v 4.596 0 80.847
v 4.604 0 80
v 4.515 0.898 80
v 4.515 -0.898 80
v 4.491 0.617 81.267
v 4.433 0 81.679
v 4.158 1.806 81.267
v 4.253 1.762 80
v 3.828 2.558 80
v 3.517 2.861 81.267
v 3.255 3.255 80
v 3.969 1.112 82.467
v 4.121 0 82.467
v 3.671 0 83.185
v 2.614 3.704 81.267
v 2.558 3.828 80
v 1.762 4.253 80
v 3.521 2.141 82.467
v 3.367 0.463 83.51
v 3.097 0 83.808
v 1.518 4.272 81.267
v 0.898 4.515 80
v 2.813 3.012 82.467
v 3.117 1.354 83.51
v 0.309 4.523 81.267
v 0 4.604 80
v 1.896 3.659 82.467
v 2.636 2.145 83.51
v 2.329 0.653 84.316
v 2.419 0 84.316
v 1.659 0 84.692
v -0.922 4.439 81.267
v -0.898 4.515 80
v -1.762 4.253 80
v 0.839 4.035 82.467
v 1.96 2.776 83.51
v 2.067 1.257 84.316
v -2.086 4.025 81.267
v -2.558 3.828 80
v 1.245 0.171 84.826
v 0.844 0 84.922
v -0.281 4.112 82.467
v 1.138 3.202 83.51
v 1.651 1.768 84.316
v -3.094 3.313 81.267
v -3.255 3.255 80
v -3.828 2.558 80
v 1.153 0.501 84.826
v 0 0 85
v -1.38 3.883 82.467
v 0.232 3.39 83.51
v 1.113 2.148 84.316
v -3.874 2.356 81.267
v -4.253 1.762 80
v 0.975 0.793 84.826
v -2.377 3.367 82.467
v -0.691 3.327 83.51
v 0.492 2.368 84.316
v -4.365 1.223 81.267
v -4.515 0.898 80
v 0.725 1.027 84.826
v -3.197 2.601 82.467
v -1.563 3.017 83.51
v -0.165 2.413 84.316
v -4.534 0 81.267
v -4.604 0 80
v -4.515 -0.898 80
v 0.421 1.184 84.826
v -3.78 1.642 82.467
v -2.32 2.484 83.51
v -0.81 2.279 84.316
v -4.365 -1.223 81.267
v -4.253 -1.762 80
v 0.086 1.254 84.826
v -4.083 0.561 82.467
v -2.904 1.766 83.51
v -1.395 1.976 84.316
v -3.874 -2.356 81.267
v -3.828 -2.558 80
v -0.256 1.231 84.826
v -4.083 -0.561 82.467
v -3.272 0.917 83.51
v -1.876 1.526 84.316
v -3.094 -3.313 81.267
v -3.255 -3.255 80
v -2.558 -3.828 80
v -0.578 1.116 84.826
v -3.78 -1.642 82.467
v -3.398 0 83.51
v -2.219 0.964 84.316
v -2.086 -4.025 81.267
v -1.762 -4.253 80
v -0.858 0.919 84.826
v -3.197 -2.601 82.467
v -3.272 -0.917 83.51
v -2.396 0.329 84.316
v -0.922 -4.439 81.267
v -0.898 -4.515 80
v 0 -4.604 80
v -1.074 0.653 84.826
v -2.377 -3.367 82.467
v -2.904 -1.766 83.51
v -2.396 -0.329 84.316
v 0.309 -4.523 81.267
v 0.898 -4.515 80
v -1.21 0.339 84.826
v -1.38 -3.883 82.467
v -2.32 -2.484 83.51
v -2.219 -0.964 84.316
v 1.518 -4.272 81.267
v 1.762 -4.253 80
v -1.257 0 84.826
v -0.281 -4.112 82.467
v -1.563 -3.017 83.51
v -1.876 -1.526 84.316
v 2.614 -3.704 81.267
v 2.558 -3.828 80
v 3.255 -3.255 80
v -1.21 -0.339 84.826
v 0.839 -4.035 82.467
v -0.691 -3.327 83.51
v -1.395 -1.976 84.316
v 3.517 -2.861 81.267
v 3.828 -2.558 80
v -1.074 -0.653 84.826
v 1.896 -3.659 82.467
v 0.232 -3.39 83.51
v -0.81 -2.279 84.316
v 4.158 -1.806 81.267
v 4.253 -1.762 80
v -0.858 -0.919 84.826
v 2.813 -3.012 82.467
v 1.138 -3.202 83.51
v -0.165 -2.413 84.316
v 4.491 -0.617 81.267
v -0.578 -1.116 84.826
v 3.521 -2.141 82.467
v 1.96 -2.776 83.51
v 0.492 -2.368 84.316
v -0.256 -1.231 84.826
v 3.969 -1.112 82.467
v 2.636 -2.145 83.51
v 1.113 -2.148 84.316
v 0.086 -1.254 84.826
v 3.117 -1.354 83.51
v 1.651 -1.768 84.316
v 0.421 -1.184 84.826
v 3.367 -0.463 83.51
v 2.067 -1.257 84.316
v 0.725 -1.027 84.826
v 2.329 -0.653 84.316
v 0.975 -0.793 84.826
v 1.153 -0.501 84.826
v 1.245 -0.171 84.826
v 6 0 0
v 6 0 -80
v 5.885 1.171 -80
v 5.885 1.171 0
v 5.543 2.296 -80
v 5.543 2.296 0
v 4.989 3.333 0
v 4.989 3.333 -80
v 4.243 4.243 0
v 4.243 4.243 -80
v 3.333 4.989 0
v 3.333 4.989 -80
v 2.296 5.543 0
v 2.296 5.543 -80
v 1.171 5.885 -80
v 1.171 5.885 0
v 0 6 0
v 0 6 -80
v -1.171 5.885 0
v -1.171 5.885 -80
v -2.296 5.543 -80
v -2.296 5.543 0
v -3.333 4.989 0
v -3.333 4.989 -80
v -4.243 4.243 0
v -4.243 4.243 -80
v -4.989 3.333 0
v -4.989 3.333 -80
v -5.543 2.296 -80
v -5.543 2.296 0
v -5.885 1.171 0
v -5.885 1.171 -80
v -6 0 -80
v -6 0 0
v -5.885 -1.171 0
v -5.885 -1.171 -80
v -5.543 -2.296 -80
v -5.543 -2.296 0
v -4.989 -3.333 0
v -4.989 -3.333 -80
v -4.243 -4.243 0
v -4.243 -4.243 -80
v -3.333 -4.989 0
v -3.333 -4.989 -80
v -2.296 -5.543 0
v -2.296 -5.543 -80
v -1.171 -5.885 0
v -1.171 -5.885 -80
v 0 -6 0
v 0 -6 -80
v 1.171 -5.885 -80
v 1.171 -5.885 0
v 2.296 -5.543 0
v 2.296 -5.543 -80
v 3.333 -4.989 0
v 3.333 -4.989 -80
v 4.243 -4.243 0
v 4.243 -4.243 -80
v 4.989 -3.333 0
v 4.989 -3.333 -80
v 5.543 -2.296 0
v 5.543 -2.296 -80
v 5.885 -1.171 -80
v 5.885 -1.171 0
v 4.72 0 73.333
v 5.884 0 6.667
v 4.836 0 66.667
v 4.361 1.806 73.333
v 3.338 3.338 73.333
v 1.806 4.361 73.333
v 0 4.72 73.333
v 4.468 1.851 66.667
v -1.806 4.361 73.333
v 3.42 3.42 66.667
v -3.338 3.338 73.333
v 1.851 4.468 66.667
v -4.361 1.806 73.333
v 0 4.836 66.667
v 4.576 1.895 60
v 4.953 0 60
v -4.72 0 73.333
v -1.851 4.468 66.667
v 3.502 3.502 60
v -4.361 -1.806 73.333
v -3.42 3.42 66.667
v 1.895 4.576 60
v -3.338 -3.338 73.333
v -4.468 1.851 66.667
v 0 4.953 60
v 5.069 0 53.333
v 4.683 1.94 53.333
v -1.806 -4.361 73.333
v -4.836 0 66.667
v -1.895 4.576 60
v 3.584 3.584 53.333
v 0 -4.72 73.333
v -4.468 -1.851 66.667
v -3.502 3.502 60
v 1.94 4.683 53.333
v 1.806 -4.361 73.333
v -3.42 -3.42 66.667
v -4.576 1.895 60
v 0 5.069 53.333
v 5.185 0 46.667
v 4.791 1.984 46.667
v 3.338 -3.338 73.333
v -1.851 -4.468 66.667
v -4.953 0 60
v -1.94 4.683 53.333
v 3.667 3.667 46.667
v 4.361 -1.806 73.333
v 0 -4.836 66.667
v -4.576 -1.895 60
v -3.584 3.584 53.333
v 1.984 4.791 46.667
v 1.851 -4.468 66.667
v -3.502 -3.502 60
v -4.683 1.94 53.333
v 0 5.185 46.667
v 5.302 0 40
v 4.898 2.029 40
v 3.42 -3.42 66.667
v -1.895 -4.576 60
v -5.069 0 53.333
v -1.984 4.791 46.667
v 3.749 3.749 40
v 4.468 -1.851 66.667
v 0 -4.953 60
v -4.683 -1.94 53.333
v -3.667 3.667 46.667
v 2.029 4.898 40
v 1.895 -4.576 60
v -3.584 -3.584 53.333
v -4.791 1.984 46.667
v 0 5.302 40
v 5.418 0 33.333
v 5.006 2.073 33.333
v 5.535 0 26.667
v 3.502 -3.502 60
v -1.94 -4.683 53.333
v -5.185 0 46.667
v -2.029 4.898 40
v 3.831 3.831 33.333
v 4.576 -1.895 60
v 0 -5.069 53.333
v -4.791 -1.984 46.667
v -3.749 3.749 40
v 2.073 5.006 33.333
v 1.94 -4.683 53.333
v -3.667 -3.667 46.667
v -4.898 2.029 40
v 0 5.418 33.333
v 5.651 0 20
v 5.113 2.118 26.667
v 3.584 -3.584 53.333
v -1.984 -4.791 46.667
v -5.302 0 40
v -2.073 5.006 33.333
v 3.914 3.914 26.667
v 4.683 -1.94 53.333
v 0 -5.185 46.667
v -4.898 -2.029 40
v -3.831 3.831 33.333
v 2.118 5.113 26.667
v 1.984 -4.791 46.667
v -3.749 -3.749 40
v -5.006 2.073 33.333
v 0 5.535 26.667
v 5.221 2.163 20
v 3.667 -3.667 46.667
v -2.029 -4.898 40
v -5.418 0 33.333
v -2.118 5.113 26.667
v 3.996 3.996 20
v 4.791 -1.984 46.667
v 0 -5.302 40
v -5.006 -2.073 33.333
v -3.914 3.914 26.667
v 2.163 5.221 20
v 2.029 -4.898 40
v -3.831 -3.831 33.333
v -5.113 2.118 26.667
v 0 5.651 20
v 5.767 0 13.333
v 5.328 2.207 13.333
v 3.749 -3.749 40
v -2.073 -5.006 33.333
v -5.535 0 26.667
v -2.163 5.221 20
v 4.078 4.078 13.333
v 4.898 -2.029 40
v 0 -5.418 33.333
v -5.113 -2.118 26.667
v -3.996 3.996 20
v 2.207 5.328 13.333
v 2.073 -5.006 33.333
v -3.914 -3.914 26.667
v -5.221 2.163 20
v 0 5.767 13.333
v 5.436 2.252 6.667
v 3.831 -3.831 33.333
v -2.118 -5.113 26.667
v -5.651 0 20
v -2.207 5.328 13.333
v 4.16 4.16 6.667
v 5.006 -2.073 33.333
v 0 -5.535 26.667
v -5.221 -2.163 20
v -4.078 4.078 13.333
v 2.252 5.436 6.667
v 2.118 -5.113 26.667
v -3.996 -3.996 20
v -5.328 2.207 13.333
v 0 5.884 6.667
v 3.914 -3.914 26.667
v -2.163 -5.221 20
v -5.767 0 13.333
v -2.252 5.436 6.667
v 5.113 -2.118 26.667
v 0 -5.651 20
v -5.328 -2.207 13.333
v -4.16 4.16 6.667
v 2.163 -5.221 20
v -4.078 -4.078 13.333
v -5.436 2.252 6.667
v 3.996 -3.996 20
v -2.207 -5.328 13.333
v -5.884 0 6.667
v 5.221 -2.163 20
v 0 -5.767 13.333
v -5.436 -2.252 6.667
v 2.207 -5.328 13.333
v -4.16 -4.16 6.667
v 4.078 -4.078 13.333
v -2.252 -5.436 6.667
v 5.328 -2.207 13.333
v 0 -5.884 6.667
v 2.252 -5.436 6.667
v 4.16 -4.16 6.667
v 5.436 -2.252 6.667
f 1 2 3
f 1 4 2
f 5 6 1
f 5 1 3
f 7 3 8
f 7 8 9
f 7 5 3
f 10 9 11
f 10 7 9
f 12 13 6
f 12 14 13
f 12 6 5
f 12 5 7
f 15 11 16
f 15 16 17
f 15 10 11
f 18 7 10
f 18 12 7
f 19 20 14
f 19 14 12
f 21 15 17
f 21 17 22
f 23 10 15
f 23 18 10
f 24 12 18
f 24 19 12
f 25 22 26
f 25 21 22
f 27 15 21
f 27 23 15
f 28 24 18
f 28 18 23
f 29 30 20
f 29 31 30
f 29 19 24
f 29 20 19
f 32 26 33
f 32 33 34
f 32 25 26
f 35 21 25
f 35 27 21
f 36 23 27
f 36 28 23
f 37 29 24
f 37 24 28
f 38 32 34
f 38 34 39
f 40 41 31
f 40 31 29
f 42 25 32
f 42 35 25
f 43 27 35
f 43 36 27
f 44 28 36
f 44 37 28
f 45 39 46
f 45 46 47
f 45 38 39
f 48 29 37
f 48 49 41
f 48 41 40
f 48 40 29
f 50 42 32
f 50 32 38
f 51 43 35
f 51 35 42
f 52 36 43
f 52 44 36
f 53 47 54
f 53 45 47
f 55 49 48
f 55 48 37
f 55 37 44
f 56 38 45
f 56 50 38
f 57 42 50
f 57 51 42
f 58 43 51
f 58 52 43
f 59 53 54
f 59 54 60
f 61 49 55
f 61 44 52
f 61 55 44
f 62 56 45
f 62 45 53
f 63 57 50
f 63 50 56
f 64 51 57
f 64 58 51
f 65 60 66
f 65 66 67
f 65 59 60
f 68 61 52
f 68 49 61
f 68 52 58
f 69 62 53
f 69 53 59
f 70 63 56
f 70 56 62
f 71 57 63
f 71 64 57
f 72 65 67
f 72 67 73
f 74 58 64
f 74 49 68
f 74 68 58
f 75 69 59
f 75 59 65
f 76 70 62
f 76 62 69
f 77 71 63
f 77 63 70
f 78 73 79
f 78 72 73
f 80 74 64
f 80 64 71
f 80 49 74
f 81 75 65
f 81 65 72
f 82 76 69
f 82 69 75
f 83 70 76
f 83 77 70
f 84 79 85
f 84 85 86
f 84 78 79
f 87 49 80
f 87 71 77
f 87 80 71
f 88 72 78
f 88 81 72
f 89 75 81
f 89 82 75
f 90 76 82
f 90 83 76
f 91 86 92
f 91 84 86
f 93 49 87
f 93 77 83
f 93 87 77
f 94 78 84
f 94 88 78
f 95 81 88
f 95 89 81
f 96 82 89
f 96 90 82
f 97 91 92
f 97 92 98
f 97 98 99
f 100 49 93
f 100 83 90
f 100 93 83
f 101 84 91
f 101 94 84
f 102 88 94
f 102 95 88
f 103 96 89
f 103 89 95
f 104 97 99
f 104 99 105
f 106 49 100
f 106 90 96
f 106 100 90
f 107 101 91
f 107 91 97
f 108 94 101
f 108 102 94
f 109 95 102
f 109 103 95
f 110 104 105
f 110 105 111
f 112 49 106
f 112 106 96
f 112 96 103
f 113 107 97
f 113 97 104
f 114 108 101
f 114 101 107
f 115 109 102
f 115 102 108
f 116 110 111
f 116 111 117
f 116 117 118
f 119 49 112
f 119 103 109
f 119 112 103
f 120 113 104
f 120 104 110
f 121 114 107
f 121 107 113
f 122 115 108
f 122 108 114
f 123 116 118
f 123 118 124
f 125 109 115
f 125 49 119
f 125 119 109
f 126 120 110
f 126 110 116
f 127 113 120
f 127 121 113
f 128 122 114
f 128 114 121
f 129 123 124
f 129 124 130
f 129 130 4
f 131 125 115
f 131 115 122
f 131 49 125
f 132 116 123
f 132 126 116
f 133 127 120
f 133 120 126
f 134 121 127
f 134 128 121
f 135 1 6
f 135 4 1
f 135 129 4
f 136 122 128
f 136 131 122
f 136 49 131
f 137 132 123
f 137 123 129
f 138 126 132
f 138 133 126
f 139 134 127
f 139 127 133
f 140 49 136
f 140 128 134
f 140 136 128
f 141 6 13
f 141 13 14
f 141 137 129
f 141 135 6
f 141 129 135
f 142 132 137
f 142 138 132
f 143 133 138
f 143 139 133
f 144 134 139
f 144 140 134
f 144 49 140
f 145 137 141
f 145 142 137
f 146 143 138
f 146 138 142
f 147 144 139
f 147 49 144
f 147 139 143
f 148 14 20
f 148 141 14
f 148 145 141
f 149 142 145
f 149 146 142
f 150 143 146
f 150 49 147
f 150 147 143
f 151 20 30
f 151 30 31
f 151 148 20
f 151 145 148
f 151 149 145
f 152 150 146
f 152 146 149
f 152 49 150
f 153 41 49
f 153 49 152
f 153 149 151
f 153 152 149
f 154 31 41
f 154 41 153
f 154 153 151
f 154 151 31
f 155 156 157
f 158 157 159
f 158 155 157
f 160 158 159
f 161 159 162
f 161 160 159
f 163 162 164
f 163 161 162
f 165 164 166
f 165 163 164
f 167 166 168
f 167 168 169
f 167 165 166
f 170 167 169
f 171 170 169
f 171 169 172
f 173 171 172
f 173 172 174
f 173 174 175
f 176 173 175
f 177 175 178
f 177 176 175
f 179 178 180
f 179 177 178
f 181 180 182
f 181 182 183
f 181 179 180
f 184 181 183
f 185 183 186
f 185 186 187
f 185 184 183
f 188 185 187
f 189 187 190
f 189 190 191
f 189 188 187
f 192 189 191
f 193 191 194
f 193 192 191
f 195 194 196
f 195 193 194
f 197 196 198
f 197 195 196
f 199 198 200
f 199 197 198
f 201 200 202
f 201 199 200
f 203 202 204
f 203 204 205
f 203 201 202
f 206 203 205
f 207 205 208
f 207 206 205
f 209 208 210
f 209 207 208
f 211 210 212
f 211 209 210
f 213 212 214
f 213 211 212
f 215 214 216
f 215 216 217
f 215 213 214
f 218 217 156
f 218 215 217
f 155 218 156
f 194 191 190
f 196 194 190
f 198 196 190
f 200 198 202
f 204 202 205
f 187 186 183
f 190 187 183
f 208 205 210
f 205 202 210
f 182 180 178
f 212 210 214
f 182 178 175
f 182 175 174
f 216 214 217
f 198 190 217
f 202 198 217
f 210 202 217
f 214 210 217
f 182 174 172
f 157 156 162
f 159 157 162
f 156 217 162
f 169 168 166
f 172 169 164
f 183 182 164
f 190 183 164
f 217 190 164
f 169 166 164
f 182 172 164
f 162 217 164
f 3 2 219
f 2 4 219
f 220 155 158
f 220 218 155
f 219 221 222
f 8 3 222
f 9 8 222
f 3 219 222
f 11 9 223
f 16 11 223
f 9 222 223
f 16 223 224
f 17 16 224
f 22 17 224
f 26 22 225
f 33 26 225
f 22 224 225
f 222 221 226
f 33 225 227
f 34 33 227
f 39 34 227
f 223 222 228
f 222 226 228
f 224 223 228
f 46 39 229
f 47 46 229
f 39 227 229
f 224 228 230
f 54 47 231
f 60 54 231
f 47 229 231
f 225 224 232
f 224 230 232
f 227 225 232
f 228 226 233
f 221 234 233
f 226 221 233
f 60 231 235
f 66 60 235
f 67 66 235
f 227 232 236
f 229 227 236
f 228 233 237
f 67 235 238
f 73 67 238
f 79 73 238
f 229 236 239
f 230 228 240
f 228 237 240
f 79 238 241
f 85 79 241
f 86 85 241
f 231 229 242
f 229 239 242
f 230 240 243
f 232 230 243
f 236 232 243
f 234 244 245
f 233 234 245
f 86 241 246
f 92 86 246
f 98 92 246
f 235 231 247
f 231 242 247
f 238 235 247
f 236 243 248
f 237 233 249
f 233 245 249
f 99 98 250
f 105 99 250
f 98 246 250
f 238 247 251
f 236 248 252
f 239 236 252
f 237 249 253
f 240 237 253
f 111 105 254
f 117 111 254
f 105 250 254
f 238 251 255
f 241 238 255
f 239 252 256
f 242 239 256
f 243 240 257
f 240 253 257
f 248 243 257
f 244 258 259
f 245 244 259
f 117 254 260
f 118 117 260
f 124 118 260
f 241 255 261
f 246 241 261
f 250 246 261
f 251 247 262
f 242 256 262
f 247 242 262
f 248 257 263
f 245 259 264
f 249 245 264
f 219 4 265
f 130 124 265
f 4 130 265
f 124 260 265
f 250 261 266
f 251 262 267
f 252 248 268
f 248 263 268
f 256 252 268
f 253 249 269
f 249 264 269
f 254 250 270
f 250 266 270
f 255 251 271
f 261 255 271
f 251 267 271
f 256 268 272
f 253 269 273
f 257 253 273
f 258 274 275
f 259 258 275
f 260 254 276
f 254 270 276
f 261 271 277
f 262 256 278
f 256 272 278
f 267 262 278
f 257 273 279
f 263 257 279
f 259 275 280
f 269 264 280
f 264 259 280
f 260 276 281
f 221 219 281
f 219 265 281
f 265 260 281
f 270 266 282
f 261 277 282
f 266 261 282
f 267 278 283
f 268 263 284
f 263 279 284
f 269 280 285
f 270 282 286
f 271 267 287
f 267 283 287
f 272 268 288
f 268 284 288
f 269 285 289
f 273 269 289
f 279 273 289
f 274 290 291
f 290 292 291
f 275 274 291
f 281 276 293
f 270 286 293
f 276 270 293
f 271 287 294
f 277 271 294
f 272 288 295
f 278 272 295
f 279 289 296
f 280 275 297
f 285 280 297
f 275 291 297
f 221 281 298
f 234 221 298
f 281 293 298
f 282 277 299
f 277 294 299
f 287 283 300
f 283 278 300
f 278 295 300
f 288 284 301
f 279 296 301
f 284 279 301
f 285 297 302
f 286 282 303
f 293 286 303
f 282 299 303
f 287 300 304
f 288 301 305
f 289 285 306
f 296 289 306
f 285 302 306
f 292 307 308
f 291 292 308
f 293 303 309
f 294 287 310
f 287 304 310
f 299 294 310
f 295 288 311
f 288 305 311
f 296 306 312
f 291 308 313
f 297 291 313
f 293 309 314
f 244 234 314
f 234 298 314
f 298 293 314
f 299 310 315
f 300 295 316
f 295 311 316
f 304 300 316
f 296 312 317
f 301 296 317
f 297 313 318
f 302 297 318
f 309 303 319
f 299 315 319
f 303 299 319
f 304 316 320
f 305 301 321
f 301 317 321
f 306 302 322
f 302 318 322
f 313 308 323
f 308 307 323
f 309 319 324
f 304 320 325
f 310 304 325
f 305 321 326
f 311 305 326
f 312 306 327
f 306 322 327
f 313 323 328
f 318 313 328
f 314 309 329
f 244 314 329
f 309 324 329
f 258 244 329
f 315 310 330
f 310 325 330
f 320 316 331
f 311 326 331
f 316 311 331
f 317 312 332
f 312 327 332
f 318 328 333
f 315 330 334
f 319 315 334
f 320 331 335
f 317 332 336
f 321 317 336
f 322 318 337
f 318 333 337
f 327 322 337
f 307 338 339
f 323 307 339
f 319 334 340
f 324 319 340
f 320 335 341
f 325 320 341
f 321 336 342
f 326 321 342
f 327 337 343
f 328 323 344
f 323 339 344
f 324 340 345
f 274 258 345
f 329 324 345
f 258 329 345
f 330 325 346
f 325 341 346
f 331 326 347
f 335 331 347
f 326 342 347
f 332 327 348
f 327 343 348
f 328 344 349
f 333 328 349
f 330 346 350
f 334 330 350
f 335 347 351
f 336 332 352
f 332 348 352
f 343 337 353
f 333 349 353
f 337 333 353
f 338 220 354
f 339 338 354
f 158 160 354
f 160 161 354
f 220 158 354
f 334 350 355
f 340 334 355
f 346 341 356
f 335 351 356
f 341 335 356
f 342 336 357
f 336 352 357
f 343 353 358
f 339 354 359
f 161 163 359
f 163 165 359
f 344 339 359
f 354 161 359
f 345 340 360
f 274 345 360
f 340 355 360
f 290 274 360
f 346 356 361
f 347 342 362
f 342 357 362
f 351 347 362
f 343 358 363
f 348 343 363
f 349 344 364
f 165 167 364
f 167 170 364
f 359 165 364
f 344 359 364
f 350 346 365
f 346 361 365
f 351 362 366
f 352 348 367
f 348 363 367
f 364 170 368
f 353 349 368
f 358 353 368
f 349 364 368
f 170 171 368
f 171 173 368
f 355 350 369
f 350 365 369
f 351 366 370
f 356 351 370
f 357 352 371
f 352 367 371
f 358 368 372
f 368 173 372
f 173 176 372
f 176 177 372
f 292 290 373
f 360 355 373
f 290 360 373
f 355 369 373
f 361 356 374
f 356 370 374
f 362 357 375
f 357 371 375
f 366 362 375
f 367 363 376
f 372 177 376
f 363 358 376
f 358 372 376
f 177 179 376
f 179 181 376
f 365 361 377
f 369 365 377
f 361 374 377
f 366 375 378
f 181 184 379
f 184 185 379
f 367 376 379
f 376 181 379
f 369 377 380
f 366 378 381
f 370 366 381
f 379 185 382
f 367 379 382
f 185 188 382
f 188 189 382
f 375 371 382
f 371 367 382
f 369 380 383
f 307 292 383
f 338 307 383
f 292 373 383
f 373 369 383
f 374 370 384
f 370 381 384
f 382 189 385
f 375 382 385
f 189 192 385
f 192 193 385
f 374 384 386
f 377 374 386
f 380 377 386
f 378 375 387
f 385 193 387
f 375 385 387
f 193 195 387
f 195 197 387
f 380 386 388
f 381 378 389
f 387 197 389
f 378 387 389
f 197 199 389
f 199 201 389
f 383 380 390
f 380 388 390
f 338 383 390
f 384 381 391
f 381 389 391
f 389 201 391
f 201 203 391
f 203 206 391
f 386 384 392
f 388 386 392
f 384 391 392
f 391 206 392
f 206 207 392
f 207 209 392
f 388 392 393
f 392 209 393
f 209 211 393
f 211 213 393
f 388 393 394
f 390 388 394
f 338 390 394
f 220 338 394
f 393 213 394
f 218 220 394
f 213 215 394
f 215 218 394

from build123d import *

# Parameters (mm, degrees)
SKETCH_1_R         = 6
EXTRUDE_2_DEPTH    = 80
DOME_1_FACE_RADIUS = 4.603594806
DOME_1_HEIGHT      = 5


# Read off the part's stored shape, not the designer's step: 拔模2
with BuildPart() as part:
    # 草图1 → 凸台-拉伸2 (new, symmetric)
    with BuildSketch(Plane.XY):
        Circle(SKETCH_1_R)
    extrude(amount=EXTRUDE_2_DEPTH, both=True)

    # 拔模2 outline → 拔模2 (revolve, cut)
    with BuildSketch(Plane.XZ):
        Polygon((6, 80), (4.603594806, 80), (6, 0), align=None)
    revolve(axis=Axis((0, 0, 0), (0, 0, 1)), mode=Mode.SUBTRACT)

    # 圆顶1: a dome of height H over a round flat face of radius A is a cap of a sphere of radius (A * A + H * H) / (2 * H)
    dome_1_r = (DOME_1_FACE_RADIUS * DOME_1_FACE_RADIUS + DOME_1_HEIGHT * DOME_1_HEIGHT) / (2 * DOME_1_HEIGHT)
    dome_1_base = Plane((0, 0, 80), z_dir=(0, 0, 1))
    with Locations(dome_1_base.offset(DOME_1_HEIGHT - dome_1_r)):
        dome_1_ball = Sphere(dome_1_r, mode=Mode.PRIVATE)
    add(split(dome_1_ball, bisect_by=dome_1_base, keep=Keep.TOP, mode=Mode.PRIVATE))


solid = part.part
